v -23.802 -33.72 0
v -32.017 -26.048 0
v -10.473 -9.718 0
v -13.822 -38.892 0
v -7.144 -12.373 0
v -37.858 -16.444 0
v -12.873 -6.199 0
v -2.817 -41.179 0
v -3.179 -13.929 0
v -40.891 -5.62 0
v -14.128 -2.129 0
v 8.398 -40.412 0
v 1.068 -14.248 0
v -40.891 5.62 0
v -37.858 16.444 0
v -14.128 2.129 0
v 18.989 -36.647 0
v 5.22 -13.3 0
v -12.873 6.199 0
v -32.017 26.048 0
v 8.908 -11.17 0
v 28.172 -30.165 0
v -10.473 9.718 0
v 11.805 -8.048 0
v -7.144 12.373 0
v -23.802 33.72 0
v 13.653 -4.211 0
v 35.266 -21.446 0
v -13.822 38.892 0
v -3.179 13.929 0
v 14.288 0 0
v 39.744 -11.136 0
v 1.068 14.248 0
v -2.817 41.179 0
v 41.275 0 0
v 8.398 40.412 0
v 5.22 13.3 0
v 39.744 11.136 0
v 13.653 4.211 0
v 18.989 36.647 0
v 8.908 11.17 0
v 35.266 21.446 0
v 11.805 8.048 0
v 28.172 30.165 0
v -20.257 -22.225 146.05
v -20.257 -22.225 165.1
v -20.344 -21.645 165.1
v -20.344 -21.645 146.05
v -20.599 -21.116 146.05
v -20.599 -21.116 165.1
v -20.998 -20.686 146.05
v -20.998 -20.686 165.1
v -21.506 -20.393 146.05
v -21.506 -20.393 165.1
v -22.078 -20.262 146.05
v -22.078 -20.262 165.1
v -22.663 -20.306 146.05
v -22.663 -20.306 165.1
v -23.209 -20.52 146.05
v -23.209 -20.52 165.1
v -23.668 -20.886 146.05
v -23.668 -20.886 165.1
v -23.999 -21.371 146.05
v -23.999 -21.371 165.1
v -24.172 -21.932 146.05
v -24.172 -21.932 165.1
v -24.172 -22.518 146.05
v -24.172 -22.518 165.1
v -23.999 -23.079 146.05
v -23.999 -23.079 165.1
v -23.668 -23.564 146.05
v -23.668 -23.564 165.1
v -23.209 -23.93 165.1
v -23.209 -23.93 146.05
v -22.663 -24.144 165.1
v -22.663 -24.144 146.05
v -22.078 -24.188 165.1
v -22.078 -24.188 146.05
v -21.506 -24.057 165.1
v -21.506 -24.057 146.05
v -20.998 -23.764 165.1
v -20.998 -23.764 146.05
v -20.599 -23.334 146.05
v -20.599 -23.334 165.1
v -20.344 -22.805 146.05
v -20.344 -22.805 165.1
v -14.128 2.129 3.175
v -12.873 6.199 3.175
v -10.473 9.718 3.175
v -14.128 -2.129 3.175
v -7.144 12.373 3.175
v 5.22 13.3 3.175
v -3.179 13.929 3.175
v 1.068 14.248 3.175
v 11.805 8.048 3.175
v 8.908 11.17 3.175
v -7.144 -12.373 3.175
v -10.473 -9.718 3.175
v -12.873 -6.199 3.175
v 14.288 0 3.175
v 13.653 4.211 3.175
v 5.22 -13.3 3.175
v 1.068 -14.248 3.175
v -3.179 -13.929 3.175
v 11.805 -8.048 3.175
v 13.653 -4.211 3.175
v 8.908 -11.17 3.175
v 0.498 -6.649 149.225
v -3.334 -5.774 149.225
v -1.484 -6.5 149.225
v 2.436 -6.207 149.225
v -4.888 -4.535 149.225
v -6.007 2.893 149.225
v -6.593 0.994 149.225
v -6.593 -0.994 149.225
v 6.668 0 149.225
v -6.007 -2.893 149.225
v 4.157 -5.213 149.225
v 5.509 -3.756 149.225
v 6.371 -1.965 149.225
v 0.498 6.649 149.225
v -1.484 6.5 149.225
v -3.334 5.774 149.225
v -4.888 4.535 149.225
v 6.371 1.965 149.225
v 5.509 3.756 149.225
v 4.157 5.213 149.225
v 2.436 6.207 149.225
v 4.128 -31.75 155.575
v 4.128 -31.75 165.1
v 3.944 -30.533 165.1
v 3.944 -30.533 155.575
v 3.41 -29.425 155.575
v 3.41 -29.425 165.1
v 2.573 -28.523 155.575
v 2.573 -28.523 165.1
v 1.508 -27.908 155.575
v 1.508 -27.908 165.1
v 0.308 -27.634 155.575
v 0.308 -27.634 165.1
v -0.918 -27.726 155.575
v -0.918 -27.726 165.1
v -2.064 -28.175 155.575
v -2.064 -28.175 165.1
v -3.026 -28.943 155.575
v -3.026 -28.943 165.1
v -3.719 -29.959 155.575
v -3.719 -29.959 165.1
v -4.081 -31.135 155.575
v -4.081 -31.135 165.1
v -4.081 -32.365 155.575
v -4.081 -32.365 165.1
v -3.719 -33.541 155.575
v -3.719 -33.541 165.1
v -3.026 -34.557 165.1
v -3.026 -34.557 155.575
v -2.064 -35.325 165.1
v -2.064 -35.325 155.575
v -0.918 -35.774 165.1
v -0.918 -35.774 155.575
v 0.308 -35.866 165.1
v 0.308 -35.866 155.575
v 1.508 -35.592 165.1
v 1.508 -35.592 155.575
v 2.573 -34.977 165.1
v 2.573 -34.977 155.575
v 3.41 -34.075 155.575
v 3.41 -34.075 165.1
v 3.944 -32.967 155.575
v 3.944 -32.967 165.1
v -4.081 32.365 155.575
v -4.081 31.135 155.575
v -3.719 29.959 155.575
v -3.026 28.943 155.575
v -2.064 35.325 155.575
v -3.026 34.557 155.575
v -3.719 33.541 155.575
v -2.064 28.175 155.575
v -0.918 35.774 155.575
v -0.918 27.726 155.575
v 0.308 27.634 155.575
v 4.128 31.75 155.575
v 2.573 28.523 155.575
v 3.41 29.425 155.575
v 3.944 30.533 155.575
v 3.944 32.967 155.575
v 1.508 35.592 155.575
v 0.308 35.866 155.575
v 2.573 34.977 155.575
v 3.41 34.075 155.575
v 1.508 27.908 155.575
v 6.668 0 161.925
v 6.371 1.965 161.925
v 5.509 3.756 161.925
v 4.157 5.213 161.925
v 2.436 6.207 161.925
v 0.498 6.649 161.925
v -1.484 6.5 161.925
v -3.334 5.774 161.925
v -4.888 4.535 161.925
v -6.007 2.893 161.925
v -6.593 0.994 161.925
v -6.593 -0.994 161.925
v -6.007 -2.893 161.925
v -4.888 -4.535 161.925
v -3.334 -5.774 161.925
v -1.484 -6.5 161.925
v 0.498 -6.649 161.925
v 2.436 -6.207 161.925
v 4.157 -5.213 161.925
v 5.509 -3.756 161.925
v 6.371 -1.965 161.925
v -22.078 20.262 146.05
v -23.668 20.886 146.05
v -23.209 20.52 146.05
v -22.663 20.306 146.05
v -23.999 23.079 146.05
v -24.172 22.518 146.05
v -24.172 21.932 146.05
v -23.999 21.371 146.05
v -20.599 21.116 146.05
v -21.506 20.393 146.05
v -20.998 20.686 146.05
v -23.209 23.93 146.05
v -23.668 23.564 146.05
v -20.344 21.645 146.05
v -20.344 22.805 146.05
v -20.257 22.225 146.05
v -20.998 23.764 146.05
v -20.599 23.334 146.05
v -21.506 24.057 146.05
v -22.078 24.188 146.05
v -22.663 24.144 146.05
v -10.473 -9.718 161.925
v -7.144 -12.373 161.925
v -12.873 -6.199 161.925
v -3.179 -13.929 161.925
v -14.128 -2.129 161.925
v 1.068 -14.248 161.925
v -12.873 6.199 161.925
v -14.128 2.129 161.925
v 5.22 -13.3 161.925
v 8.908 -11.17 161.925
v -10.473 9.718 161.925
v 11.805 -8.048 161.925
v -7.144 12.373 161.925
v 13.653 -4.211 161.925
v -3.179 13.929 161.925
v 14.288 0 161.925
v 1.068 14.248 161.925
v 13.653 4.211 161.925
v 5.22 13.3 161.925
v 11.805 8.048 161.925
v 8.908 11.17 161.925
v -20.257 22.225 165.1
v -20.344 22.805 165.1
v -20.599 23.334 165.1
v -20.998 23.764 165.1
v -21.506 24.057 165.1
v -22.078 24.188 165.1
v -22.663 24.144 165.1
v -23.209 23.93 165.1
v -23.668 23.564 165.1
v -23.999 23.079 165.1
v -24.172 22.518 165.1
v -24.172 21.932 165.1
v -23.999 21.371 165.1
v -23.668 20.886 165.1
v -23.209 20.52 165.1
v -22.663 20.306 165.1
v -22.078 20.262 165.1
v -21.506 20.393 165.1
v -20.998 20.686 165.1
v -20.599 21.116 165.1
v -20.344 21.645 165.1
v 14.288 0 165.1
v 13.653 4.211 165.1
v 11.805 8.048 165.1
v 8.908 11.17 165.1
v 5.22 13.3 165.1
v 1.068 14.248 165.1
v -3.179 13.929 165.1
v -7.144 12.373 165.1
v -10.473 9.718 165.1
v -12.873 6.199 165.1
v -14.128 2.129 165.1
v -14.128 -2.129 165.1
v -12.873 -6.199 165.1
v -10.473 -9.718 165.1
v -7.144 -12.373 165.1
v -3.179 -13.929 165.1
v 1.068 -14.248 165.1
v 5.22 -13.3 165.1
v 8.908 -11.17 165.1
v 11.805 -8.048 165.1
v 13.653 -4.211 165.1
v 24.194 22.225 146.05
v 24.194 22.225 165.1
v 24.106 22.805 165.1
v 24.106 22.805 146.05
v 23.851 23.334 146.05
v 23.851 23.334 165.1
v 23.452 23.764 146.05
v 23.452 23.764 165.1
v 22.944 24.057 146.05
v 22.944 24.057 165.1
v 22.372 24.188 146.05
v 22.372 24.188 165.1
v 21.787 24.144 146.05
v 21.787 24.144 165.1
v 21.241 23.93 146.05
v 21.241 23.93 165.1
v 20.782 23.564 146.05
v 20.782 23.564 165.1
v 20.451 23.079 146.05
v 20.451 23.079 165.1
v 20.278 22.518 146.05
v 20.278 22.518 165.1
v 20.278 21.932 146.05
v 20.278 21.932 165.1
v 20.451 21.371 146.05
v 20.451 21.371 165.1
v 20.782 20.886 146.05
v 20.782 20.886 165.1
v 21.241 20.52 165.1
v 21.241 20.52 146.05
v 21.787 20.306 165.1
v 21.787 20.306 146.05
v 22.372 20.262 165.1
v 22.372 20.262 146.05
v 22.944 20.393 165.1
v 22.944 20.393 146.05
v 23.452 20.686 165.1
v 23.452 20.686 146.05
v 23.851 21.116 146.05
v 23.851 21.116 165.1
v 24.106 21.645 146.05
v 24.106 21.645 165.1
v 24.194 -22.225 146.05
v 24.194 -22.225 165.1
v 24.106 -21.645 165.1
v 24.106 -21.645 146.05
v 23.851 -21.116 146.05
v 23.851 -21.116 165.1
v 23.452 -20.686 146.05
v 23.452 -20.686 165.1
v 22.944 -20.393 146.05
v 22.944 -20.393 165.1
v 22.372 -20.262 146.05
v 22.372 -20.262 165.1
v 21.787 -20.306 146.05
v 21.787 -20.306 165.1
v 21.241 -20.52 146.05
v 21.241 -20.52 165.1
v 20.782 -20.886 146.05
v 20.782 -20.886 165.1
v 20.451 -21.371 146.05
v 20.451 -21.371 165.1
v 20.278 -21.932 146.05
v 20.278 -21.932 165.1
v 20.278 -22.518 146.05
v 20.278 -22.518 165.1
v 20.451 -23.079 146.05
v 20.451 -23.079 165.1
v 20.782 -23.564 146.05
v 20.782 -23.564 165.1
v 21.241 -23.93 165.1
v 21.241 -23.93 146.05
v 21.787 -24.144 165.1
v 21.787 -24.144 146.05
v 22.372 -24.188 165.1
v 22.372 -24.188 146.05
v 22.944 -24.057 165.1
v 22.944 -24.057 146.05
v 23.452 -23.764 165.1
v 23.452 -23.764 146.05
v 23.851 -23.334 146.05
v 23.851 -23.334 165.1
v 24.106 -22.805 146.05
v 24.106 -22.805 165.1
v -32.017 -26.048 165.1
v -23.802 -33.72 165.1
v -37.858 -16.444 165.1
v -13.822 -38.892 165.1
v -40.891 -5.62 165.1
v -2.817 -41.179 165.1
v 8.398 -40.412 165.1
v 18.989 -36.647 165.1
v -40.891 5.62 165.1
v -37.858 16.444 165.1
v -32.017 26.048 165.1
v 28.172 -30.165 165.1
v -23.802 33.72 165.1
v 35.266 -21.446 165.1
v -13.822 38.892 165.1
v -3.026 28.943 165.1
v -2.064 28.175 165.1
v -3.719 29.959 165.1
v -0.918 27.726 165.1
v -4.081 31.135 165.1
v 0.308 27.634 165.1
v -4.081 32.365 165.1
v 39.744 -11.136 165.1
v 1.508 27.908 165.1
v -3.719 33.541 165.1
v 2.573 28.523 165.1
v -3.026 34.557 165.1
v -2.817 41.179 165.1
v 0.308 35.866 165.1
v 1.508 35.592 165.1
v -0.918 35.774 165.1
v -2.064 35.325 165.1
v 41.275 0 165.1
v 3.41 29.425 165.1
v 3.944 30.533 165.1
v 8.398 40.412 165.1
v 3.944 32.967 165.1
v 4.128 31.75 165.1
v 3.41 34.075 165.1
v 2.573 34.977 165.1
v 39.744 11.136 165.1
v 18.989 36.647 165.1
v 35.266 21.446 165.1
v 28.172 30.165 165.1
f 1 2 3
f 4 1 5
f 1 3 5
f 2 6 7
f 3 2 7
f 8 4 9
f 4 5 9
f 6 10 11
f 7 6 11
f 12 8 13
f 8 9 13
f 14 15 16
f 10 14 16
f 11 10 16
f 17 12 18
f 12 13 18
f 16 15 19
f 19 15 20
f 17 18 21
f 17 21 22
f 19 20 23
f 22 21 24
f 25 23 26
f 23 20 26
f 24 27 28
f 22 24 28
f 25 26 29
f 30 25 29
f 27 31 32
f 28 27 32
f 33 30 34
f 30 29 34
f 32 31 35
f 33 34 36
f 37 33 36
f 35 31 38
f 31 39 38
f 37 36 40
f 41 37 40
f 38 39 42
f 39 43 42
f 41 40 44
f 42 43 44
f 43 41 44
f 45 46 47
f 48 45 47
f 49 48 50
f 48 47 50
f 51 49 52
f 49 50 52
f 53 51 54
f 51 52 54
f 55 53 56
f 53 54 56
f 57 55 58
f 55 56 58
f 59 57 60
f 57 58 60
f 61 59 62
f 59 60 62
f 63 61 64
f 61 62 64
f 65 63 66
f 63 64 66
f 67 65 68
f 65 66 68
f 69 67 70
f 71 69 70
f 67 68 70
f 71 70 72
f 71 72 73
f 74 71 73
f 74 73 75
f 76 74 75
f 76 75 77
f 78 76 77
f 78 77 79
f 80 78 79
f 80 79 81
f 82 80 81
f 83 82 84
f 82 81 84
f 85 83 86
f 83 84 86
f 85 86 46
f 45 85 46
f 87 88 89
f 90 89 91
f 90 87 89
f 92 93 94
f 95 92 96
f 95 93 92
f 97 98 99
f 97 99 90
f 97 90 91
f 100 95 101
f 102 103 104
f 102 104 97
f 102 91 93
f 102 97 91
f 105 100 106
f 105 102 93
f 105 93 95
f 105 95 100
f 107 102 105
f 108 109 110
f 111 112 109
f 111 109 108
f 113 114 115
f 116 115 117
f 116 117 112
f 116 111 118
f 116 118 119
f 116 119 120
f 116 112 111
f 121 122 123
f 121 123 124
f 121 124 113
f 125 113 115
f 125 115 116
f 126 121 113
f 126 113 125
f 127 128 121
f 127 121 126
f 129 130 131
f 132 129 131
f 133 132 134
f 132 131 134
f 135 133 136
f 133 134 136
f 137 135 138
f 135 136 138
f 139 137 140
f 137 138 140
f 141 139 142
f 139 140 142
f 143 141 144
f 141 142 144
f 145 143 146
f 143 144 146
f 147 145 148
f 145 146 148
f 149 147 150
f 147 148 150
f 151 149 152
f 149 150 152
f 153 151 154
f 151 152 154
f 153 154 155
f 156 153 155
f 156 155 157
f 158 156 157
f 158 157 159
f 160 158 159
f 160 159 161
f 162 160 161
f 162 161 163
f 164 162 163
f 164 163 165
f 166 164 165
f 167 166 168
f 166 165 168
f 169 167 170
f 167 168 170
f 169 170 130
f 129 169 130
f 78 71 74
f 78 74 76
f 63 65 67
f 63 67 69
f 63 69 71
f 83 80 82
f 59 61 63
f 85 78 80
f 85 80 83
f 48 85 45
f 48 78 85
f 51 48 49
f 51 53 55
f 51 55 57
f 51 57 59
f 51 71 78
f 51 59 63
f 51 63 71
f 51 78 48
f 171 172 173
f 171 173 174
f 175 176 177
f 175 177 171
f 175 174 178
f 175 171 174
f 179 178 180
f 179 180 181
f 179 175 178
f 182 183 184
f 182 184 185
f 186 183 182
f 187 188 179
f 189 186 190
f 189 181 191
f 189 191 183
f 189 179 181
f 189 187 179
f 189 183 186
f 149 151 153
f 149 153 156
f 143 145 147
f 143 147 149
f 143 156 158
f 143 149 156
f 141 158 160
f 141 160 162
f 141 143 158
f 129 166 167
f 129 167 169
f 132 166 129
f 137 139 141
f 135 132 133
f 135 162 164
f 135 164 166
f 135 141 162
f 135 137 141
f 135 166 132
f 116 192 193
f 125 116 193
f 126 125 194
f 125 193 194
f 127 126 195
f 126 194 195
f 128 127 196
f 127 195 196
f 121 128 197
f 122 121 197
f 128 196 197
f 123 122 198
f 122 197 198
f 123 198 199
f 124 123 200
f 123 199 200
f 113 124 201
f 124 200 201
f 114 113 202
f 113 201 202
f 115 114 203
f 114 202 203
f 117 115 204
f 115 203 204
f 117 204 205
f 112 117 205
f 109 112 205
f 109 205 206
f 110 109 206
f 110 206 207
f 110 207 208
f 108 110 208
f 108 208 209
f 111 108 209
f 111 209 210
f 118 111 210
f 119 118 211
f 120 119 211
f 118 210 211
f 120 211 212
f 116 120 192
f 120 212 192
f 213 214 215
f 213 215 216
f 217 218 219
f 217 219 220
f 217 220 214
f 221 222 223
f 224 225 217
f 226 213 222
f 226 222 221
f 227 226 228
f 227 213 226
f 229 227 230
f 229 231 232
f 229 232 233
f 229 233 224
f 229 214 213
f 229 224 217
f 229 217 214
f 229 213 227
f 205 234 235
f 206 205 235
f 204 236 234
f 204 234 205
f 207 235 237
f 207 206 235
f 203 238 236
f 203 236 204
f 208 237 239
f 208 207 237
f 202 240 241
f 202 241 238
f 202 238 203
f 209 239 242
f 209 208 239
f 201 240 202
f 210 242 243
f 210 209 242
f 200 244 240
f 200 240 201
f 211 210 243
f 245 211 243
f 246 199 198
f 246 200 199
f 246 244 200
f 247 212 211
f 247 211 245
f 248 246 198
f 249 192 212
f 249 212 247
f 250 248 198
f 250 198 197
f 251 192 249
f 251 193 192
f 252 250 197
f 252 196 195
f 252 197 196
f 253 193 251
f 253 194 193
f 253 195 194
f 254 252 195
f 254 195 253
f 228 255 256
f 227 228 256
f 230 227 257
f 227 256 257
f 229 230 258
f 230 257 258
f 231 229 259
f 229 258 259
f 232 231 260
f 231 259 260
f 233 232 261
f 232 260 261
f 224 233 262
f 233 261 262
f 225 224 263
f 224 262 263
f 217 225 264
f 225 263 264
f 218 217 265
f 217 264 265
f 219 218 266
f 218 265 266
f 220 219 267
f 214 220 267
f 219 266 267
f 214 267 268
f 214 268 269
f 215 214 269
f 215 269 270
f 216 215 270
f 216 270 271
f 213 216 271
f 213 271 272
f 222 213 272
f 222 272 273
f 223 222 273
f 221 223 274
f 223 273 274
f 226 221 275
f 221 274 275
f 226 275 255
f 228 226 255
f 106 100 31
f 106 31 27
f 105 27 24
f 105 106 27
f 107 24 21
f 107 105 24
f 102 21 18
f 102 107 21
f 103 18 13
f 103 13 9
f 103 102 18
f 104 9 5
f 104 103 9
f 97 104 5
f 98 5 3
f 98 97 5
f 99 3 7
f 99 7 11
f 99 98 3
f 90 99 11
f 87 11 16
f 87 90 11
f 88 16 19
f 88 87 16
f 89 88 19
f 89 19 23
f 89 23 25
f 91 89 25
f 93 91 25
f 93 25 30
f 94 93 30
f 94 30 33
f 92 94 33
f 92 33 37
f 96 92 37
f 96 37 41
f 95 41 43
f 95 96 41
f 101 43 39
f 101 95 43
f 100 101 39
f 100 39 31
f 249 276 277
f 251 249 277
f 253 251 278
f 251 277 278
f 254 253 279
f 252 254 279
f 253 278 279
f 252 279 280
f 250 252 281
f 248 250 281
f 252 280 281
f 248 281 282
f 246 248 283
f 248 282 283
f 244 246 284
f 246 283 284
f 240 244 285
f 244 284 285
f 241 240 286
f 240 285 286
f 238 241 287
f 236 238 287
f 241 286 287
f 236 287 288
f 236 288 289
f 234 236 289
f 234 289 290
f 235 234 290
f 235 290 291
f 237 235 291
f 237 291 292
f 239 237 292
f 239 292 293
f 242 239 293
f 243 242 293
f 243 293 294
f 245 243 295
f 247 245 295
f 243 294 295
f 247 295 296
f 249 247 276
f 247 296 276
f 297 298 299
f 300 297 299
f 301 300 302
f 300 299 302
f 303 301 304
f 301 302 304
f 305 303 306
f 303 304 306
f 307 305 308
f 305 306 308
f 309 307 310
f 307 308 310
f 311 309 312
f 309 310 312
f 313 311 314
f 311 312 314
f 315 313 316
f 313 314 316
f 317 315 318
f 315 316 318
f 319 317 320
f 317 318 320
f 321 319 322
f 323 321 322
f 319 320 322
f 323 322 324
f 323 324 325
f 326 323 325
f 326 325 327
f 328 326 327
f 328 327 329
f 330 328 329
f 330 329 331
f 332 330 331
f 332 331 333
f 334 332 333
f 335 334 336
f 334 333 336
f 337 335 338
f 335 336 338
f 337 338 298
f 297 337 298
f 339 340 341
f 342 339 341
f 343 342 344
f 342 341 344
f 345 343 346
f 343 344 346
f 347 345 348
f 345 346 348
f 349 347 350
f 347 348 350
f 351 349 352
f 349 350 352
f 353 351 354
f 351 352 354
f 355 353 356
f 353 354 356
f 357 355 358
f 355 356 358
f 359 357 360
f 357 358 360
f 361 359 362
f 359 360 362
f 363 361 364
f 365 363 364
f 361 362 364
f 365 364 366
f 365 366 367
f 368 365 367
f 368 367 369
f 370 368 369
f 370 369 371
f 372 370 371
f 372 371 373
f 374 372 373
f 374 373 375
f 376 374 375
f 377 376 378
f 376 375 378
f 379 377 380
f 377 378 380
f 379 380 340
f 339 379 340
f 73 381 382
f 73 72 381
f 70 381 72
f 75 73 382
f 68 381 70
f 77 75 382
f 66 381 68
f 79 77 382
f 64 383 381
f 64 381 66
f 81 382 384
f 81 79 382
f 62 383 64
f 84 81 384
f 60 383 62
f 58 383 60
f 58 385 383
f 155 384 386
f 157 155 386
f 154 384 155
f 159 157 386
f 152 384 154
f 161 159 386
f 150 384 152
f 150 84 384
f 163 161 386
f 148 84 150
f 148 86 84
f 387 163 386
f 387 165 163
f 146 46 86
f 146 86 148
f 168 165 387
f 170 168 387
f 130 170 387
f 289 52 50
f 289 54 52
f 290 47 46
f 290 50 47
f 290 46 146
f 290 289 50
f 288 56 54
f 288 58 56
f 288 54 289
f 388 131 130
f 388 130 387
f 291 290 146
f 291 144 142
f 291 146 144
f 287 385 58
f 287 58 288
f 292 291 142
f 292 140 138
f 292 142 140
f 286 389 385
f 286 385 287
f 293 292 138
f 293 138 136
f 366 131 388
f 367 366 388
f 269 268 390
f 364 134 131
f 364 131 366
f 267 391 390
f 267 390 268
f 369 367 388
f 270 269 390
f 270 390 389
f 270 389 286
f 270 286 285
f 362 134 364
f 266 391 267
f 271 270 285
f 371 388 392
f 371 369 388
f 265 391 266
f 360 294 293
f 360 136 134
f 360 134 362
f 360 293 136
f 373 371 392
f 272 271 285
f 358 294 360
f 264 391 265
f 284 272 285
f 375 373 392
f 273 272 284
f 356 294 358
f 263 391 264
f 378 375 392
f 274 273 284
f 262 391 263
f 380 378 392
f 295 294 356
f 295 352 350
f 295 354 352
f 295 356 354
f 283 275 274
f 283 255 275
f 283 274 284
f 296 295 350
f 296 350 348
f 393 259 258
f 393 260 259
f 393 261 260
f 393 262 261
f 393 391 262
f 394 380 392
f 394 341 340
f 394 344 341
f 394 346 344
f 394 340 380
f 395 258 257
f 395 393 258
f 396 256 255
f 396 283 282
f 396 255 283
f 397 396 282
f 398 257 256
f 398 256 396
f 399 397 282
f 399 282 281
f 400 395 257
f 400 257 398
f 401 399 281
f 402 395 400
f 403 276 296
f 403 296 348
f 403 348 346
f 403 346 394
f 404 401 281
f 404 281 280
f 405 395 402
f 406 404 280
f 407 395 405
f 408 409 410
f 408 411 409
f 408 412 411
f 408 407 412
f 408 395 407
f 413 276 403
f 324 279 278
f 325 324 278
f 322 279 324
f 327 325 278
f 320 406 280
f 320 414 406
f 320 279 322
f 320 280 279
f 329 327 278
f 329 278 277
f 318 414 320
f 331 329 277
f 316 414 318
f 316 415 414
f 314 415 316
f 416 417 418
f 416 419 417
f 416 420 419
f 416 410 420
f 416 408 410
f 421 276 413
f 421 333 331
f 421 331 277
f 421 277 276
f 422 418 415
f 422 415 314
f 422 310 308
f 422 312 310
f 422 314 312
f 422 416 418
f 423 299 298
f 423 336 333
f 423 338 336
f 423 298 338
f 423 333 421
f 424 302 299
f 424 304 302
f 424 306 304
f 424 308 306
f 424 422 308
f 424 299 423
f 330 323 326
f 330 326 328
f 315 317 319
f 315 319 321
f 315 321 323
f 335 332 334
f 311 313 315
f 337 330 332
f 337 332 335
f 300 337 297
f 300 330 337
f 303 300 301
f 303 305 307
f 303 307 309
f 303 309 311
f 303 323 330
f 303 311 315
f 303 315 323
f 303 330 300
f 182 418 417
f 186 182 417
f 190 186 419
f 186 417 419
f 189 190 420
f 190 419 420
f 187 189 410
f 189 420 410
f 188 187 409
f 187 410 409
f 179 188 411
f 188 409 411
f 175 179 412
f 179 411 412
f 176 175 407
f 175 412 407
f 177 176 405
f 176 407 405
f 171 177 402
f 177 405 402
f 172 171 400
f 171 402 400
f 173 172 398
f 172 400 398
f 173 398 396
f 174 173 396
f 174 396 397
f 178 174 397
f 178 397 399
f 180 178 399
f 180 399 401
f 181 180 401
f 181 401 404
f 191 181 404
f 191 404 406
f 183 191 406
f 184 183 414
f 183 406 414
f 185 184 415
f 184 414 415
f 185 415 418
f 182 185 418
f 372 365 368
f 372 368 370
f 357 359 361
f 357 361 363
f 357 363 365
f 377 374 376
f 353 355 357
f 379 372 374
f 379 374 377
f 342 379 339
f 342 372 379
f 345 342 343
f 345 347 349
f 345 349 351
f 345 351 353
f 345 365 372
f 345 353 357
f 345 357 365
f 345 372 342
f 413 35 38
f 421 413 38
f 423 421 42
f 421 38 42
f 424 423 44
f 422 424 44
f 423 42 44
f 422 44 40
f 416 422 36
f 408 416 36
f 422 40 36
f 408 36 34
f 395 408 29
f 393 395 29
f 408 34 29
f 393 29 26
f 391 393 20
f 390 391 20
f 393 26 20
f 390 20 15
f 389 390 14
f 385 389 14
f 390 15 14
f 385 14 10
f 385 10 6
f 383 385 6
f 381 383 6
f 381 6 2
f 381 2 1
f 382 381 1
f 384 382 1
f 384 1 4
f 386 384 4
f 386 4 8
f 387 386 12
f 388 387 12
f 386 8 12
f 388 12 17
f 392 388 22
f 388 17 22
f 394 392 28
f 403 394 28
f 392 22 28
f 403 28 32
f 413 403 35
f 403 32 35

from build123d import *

# Parameters (mm, degrees)
SKETCH1_R           = 41.275
BOSS_EXTRUDE1_DEPTH = 165.1
SKETCH2_R           = 14.2875
CUT_EXTRUDE1_DEPTH  = 3.175
SKETCH3_R           = 6.6675
CUT_EXTRUDE2_DEPTH  = 12.7
SKETCH4_R           = 4.1275
CUT_EXTRUDE3_DEPTH  = 9.525
SKETCH5_R           = 1.9685
CUT_EXTRUDE4_DEPTH  = 19.05
CUT_EXTRUDE5_START  = -3.175
SKETCH6_R           = 14.2875
CUT_EXTRUDE5_DEPTH  = 3.175


with BuildPart() as part:
    # Sketch1 → Boss-Extrude1 (new body)
    with BuildSketch(Plane.XY):
        Circle(SKETCH1_R)
    extrude(amount=BOSS_EXTRUDE1_DEPTH)

    # Sketch2 → Cut-Extrude1 (cut)
    with BuildSketch(Plane.XY.offset(165.1)):
        Circle(SKETCH2_R)
    extrude(amount=-CUT_EXTRUDE1_DEPTH, mode=Mode.SUBTRACT)

    # Sketch3 → Cut-Extrude2 (cut)
    with BuildSketch(Plane.XY.offset(161.925)):
        Circle(SKETCH3_R)
    extrude(amount=-CUT_EXTRUDE2_DEPTH, mode=Mode.SUBTRACT)

    # Sketch4 → Cut-Extrude3 (cut)
    with BuildSketch(Plane.XY.offset(165.1)):
        with Locations((0, 31.75)):
            Circle(SKETCH4_R)
        with Locations((0, -31.75)):
            Circle(SKETCH4_R)
    extrude(amount=-CUT_EXTRUDE3_DEPTH, mode=Mode.SUBTRACT)

    # Sketch5 → Cut-Extrude4 (cut)
    with BuildSketch(Plane.XY.offset(165.1)):
        with Locations((-22.225, 22.225)):
            Circle(SKETCH5_R)
        with Locations((-22.225, -22.225)):
            Circle(SKETCH5_R)
        with Locations((22.225, -22.225)):
            Circle(SKETCH5_R)
        with Locations((22.225, 22.225)):
            Circle(SKETCH5_R)
    extrude(amount=-CUT_EXTRUDE4_DEPTH, mode=Mode.SUBTRACT)

    # Sketch6 → Cut-Extrude5 (cut)
    with BuildSketch(Plane(origin=(0, 0, 0), x_dir=(-1, 0, 0), z_dir=(0, 0, -1)).offset(CUT_EXTRUDE5_START)):
        with Locations(Location((0, 0, 0), (0, 0, 180))):
            Circle(SKETCH6_R)
    extrude(amount=CUT_EXTRUDE5_DEPTH, mode=Mode.SUBTRACT)


solid = part.part
